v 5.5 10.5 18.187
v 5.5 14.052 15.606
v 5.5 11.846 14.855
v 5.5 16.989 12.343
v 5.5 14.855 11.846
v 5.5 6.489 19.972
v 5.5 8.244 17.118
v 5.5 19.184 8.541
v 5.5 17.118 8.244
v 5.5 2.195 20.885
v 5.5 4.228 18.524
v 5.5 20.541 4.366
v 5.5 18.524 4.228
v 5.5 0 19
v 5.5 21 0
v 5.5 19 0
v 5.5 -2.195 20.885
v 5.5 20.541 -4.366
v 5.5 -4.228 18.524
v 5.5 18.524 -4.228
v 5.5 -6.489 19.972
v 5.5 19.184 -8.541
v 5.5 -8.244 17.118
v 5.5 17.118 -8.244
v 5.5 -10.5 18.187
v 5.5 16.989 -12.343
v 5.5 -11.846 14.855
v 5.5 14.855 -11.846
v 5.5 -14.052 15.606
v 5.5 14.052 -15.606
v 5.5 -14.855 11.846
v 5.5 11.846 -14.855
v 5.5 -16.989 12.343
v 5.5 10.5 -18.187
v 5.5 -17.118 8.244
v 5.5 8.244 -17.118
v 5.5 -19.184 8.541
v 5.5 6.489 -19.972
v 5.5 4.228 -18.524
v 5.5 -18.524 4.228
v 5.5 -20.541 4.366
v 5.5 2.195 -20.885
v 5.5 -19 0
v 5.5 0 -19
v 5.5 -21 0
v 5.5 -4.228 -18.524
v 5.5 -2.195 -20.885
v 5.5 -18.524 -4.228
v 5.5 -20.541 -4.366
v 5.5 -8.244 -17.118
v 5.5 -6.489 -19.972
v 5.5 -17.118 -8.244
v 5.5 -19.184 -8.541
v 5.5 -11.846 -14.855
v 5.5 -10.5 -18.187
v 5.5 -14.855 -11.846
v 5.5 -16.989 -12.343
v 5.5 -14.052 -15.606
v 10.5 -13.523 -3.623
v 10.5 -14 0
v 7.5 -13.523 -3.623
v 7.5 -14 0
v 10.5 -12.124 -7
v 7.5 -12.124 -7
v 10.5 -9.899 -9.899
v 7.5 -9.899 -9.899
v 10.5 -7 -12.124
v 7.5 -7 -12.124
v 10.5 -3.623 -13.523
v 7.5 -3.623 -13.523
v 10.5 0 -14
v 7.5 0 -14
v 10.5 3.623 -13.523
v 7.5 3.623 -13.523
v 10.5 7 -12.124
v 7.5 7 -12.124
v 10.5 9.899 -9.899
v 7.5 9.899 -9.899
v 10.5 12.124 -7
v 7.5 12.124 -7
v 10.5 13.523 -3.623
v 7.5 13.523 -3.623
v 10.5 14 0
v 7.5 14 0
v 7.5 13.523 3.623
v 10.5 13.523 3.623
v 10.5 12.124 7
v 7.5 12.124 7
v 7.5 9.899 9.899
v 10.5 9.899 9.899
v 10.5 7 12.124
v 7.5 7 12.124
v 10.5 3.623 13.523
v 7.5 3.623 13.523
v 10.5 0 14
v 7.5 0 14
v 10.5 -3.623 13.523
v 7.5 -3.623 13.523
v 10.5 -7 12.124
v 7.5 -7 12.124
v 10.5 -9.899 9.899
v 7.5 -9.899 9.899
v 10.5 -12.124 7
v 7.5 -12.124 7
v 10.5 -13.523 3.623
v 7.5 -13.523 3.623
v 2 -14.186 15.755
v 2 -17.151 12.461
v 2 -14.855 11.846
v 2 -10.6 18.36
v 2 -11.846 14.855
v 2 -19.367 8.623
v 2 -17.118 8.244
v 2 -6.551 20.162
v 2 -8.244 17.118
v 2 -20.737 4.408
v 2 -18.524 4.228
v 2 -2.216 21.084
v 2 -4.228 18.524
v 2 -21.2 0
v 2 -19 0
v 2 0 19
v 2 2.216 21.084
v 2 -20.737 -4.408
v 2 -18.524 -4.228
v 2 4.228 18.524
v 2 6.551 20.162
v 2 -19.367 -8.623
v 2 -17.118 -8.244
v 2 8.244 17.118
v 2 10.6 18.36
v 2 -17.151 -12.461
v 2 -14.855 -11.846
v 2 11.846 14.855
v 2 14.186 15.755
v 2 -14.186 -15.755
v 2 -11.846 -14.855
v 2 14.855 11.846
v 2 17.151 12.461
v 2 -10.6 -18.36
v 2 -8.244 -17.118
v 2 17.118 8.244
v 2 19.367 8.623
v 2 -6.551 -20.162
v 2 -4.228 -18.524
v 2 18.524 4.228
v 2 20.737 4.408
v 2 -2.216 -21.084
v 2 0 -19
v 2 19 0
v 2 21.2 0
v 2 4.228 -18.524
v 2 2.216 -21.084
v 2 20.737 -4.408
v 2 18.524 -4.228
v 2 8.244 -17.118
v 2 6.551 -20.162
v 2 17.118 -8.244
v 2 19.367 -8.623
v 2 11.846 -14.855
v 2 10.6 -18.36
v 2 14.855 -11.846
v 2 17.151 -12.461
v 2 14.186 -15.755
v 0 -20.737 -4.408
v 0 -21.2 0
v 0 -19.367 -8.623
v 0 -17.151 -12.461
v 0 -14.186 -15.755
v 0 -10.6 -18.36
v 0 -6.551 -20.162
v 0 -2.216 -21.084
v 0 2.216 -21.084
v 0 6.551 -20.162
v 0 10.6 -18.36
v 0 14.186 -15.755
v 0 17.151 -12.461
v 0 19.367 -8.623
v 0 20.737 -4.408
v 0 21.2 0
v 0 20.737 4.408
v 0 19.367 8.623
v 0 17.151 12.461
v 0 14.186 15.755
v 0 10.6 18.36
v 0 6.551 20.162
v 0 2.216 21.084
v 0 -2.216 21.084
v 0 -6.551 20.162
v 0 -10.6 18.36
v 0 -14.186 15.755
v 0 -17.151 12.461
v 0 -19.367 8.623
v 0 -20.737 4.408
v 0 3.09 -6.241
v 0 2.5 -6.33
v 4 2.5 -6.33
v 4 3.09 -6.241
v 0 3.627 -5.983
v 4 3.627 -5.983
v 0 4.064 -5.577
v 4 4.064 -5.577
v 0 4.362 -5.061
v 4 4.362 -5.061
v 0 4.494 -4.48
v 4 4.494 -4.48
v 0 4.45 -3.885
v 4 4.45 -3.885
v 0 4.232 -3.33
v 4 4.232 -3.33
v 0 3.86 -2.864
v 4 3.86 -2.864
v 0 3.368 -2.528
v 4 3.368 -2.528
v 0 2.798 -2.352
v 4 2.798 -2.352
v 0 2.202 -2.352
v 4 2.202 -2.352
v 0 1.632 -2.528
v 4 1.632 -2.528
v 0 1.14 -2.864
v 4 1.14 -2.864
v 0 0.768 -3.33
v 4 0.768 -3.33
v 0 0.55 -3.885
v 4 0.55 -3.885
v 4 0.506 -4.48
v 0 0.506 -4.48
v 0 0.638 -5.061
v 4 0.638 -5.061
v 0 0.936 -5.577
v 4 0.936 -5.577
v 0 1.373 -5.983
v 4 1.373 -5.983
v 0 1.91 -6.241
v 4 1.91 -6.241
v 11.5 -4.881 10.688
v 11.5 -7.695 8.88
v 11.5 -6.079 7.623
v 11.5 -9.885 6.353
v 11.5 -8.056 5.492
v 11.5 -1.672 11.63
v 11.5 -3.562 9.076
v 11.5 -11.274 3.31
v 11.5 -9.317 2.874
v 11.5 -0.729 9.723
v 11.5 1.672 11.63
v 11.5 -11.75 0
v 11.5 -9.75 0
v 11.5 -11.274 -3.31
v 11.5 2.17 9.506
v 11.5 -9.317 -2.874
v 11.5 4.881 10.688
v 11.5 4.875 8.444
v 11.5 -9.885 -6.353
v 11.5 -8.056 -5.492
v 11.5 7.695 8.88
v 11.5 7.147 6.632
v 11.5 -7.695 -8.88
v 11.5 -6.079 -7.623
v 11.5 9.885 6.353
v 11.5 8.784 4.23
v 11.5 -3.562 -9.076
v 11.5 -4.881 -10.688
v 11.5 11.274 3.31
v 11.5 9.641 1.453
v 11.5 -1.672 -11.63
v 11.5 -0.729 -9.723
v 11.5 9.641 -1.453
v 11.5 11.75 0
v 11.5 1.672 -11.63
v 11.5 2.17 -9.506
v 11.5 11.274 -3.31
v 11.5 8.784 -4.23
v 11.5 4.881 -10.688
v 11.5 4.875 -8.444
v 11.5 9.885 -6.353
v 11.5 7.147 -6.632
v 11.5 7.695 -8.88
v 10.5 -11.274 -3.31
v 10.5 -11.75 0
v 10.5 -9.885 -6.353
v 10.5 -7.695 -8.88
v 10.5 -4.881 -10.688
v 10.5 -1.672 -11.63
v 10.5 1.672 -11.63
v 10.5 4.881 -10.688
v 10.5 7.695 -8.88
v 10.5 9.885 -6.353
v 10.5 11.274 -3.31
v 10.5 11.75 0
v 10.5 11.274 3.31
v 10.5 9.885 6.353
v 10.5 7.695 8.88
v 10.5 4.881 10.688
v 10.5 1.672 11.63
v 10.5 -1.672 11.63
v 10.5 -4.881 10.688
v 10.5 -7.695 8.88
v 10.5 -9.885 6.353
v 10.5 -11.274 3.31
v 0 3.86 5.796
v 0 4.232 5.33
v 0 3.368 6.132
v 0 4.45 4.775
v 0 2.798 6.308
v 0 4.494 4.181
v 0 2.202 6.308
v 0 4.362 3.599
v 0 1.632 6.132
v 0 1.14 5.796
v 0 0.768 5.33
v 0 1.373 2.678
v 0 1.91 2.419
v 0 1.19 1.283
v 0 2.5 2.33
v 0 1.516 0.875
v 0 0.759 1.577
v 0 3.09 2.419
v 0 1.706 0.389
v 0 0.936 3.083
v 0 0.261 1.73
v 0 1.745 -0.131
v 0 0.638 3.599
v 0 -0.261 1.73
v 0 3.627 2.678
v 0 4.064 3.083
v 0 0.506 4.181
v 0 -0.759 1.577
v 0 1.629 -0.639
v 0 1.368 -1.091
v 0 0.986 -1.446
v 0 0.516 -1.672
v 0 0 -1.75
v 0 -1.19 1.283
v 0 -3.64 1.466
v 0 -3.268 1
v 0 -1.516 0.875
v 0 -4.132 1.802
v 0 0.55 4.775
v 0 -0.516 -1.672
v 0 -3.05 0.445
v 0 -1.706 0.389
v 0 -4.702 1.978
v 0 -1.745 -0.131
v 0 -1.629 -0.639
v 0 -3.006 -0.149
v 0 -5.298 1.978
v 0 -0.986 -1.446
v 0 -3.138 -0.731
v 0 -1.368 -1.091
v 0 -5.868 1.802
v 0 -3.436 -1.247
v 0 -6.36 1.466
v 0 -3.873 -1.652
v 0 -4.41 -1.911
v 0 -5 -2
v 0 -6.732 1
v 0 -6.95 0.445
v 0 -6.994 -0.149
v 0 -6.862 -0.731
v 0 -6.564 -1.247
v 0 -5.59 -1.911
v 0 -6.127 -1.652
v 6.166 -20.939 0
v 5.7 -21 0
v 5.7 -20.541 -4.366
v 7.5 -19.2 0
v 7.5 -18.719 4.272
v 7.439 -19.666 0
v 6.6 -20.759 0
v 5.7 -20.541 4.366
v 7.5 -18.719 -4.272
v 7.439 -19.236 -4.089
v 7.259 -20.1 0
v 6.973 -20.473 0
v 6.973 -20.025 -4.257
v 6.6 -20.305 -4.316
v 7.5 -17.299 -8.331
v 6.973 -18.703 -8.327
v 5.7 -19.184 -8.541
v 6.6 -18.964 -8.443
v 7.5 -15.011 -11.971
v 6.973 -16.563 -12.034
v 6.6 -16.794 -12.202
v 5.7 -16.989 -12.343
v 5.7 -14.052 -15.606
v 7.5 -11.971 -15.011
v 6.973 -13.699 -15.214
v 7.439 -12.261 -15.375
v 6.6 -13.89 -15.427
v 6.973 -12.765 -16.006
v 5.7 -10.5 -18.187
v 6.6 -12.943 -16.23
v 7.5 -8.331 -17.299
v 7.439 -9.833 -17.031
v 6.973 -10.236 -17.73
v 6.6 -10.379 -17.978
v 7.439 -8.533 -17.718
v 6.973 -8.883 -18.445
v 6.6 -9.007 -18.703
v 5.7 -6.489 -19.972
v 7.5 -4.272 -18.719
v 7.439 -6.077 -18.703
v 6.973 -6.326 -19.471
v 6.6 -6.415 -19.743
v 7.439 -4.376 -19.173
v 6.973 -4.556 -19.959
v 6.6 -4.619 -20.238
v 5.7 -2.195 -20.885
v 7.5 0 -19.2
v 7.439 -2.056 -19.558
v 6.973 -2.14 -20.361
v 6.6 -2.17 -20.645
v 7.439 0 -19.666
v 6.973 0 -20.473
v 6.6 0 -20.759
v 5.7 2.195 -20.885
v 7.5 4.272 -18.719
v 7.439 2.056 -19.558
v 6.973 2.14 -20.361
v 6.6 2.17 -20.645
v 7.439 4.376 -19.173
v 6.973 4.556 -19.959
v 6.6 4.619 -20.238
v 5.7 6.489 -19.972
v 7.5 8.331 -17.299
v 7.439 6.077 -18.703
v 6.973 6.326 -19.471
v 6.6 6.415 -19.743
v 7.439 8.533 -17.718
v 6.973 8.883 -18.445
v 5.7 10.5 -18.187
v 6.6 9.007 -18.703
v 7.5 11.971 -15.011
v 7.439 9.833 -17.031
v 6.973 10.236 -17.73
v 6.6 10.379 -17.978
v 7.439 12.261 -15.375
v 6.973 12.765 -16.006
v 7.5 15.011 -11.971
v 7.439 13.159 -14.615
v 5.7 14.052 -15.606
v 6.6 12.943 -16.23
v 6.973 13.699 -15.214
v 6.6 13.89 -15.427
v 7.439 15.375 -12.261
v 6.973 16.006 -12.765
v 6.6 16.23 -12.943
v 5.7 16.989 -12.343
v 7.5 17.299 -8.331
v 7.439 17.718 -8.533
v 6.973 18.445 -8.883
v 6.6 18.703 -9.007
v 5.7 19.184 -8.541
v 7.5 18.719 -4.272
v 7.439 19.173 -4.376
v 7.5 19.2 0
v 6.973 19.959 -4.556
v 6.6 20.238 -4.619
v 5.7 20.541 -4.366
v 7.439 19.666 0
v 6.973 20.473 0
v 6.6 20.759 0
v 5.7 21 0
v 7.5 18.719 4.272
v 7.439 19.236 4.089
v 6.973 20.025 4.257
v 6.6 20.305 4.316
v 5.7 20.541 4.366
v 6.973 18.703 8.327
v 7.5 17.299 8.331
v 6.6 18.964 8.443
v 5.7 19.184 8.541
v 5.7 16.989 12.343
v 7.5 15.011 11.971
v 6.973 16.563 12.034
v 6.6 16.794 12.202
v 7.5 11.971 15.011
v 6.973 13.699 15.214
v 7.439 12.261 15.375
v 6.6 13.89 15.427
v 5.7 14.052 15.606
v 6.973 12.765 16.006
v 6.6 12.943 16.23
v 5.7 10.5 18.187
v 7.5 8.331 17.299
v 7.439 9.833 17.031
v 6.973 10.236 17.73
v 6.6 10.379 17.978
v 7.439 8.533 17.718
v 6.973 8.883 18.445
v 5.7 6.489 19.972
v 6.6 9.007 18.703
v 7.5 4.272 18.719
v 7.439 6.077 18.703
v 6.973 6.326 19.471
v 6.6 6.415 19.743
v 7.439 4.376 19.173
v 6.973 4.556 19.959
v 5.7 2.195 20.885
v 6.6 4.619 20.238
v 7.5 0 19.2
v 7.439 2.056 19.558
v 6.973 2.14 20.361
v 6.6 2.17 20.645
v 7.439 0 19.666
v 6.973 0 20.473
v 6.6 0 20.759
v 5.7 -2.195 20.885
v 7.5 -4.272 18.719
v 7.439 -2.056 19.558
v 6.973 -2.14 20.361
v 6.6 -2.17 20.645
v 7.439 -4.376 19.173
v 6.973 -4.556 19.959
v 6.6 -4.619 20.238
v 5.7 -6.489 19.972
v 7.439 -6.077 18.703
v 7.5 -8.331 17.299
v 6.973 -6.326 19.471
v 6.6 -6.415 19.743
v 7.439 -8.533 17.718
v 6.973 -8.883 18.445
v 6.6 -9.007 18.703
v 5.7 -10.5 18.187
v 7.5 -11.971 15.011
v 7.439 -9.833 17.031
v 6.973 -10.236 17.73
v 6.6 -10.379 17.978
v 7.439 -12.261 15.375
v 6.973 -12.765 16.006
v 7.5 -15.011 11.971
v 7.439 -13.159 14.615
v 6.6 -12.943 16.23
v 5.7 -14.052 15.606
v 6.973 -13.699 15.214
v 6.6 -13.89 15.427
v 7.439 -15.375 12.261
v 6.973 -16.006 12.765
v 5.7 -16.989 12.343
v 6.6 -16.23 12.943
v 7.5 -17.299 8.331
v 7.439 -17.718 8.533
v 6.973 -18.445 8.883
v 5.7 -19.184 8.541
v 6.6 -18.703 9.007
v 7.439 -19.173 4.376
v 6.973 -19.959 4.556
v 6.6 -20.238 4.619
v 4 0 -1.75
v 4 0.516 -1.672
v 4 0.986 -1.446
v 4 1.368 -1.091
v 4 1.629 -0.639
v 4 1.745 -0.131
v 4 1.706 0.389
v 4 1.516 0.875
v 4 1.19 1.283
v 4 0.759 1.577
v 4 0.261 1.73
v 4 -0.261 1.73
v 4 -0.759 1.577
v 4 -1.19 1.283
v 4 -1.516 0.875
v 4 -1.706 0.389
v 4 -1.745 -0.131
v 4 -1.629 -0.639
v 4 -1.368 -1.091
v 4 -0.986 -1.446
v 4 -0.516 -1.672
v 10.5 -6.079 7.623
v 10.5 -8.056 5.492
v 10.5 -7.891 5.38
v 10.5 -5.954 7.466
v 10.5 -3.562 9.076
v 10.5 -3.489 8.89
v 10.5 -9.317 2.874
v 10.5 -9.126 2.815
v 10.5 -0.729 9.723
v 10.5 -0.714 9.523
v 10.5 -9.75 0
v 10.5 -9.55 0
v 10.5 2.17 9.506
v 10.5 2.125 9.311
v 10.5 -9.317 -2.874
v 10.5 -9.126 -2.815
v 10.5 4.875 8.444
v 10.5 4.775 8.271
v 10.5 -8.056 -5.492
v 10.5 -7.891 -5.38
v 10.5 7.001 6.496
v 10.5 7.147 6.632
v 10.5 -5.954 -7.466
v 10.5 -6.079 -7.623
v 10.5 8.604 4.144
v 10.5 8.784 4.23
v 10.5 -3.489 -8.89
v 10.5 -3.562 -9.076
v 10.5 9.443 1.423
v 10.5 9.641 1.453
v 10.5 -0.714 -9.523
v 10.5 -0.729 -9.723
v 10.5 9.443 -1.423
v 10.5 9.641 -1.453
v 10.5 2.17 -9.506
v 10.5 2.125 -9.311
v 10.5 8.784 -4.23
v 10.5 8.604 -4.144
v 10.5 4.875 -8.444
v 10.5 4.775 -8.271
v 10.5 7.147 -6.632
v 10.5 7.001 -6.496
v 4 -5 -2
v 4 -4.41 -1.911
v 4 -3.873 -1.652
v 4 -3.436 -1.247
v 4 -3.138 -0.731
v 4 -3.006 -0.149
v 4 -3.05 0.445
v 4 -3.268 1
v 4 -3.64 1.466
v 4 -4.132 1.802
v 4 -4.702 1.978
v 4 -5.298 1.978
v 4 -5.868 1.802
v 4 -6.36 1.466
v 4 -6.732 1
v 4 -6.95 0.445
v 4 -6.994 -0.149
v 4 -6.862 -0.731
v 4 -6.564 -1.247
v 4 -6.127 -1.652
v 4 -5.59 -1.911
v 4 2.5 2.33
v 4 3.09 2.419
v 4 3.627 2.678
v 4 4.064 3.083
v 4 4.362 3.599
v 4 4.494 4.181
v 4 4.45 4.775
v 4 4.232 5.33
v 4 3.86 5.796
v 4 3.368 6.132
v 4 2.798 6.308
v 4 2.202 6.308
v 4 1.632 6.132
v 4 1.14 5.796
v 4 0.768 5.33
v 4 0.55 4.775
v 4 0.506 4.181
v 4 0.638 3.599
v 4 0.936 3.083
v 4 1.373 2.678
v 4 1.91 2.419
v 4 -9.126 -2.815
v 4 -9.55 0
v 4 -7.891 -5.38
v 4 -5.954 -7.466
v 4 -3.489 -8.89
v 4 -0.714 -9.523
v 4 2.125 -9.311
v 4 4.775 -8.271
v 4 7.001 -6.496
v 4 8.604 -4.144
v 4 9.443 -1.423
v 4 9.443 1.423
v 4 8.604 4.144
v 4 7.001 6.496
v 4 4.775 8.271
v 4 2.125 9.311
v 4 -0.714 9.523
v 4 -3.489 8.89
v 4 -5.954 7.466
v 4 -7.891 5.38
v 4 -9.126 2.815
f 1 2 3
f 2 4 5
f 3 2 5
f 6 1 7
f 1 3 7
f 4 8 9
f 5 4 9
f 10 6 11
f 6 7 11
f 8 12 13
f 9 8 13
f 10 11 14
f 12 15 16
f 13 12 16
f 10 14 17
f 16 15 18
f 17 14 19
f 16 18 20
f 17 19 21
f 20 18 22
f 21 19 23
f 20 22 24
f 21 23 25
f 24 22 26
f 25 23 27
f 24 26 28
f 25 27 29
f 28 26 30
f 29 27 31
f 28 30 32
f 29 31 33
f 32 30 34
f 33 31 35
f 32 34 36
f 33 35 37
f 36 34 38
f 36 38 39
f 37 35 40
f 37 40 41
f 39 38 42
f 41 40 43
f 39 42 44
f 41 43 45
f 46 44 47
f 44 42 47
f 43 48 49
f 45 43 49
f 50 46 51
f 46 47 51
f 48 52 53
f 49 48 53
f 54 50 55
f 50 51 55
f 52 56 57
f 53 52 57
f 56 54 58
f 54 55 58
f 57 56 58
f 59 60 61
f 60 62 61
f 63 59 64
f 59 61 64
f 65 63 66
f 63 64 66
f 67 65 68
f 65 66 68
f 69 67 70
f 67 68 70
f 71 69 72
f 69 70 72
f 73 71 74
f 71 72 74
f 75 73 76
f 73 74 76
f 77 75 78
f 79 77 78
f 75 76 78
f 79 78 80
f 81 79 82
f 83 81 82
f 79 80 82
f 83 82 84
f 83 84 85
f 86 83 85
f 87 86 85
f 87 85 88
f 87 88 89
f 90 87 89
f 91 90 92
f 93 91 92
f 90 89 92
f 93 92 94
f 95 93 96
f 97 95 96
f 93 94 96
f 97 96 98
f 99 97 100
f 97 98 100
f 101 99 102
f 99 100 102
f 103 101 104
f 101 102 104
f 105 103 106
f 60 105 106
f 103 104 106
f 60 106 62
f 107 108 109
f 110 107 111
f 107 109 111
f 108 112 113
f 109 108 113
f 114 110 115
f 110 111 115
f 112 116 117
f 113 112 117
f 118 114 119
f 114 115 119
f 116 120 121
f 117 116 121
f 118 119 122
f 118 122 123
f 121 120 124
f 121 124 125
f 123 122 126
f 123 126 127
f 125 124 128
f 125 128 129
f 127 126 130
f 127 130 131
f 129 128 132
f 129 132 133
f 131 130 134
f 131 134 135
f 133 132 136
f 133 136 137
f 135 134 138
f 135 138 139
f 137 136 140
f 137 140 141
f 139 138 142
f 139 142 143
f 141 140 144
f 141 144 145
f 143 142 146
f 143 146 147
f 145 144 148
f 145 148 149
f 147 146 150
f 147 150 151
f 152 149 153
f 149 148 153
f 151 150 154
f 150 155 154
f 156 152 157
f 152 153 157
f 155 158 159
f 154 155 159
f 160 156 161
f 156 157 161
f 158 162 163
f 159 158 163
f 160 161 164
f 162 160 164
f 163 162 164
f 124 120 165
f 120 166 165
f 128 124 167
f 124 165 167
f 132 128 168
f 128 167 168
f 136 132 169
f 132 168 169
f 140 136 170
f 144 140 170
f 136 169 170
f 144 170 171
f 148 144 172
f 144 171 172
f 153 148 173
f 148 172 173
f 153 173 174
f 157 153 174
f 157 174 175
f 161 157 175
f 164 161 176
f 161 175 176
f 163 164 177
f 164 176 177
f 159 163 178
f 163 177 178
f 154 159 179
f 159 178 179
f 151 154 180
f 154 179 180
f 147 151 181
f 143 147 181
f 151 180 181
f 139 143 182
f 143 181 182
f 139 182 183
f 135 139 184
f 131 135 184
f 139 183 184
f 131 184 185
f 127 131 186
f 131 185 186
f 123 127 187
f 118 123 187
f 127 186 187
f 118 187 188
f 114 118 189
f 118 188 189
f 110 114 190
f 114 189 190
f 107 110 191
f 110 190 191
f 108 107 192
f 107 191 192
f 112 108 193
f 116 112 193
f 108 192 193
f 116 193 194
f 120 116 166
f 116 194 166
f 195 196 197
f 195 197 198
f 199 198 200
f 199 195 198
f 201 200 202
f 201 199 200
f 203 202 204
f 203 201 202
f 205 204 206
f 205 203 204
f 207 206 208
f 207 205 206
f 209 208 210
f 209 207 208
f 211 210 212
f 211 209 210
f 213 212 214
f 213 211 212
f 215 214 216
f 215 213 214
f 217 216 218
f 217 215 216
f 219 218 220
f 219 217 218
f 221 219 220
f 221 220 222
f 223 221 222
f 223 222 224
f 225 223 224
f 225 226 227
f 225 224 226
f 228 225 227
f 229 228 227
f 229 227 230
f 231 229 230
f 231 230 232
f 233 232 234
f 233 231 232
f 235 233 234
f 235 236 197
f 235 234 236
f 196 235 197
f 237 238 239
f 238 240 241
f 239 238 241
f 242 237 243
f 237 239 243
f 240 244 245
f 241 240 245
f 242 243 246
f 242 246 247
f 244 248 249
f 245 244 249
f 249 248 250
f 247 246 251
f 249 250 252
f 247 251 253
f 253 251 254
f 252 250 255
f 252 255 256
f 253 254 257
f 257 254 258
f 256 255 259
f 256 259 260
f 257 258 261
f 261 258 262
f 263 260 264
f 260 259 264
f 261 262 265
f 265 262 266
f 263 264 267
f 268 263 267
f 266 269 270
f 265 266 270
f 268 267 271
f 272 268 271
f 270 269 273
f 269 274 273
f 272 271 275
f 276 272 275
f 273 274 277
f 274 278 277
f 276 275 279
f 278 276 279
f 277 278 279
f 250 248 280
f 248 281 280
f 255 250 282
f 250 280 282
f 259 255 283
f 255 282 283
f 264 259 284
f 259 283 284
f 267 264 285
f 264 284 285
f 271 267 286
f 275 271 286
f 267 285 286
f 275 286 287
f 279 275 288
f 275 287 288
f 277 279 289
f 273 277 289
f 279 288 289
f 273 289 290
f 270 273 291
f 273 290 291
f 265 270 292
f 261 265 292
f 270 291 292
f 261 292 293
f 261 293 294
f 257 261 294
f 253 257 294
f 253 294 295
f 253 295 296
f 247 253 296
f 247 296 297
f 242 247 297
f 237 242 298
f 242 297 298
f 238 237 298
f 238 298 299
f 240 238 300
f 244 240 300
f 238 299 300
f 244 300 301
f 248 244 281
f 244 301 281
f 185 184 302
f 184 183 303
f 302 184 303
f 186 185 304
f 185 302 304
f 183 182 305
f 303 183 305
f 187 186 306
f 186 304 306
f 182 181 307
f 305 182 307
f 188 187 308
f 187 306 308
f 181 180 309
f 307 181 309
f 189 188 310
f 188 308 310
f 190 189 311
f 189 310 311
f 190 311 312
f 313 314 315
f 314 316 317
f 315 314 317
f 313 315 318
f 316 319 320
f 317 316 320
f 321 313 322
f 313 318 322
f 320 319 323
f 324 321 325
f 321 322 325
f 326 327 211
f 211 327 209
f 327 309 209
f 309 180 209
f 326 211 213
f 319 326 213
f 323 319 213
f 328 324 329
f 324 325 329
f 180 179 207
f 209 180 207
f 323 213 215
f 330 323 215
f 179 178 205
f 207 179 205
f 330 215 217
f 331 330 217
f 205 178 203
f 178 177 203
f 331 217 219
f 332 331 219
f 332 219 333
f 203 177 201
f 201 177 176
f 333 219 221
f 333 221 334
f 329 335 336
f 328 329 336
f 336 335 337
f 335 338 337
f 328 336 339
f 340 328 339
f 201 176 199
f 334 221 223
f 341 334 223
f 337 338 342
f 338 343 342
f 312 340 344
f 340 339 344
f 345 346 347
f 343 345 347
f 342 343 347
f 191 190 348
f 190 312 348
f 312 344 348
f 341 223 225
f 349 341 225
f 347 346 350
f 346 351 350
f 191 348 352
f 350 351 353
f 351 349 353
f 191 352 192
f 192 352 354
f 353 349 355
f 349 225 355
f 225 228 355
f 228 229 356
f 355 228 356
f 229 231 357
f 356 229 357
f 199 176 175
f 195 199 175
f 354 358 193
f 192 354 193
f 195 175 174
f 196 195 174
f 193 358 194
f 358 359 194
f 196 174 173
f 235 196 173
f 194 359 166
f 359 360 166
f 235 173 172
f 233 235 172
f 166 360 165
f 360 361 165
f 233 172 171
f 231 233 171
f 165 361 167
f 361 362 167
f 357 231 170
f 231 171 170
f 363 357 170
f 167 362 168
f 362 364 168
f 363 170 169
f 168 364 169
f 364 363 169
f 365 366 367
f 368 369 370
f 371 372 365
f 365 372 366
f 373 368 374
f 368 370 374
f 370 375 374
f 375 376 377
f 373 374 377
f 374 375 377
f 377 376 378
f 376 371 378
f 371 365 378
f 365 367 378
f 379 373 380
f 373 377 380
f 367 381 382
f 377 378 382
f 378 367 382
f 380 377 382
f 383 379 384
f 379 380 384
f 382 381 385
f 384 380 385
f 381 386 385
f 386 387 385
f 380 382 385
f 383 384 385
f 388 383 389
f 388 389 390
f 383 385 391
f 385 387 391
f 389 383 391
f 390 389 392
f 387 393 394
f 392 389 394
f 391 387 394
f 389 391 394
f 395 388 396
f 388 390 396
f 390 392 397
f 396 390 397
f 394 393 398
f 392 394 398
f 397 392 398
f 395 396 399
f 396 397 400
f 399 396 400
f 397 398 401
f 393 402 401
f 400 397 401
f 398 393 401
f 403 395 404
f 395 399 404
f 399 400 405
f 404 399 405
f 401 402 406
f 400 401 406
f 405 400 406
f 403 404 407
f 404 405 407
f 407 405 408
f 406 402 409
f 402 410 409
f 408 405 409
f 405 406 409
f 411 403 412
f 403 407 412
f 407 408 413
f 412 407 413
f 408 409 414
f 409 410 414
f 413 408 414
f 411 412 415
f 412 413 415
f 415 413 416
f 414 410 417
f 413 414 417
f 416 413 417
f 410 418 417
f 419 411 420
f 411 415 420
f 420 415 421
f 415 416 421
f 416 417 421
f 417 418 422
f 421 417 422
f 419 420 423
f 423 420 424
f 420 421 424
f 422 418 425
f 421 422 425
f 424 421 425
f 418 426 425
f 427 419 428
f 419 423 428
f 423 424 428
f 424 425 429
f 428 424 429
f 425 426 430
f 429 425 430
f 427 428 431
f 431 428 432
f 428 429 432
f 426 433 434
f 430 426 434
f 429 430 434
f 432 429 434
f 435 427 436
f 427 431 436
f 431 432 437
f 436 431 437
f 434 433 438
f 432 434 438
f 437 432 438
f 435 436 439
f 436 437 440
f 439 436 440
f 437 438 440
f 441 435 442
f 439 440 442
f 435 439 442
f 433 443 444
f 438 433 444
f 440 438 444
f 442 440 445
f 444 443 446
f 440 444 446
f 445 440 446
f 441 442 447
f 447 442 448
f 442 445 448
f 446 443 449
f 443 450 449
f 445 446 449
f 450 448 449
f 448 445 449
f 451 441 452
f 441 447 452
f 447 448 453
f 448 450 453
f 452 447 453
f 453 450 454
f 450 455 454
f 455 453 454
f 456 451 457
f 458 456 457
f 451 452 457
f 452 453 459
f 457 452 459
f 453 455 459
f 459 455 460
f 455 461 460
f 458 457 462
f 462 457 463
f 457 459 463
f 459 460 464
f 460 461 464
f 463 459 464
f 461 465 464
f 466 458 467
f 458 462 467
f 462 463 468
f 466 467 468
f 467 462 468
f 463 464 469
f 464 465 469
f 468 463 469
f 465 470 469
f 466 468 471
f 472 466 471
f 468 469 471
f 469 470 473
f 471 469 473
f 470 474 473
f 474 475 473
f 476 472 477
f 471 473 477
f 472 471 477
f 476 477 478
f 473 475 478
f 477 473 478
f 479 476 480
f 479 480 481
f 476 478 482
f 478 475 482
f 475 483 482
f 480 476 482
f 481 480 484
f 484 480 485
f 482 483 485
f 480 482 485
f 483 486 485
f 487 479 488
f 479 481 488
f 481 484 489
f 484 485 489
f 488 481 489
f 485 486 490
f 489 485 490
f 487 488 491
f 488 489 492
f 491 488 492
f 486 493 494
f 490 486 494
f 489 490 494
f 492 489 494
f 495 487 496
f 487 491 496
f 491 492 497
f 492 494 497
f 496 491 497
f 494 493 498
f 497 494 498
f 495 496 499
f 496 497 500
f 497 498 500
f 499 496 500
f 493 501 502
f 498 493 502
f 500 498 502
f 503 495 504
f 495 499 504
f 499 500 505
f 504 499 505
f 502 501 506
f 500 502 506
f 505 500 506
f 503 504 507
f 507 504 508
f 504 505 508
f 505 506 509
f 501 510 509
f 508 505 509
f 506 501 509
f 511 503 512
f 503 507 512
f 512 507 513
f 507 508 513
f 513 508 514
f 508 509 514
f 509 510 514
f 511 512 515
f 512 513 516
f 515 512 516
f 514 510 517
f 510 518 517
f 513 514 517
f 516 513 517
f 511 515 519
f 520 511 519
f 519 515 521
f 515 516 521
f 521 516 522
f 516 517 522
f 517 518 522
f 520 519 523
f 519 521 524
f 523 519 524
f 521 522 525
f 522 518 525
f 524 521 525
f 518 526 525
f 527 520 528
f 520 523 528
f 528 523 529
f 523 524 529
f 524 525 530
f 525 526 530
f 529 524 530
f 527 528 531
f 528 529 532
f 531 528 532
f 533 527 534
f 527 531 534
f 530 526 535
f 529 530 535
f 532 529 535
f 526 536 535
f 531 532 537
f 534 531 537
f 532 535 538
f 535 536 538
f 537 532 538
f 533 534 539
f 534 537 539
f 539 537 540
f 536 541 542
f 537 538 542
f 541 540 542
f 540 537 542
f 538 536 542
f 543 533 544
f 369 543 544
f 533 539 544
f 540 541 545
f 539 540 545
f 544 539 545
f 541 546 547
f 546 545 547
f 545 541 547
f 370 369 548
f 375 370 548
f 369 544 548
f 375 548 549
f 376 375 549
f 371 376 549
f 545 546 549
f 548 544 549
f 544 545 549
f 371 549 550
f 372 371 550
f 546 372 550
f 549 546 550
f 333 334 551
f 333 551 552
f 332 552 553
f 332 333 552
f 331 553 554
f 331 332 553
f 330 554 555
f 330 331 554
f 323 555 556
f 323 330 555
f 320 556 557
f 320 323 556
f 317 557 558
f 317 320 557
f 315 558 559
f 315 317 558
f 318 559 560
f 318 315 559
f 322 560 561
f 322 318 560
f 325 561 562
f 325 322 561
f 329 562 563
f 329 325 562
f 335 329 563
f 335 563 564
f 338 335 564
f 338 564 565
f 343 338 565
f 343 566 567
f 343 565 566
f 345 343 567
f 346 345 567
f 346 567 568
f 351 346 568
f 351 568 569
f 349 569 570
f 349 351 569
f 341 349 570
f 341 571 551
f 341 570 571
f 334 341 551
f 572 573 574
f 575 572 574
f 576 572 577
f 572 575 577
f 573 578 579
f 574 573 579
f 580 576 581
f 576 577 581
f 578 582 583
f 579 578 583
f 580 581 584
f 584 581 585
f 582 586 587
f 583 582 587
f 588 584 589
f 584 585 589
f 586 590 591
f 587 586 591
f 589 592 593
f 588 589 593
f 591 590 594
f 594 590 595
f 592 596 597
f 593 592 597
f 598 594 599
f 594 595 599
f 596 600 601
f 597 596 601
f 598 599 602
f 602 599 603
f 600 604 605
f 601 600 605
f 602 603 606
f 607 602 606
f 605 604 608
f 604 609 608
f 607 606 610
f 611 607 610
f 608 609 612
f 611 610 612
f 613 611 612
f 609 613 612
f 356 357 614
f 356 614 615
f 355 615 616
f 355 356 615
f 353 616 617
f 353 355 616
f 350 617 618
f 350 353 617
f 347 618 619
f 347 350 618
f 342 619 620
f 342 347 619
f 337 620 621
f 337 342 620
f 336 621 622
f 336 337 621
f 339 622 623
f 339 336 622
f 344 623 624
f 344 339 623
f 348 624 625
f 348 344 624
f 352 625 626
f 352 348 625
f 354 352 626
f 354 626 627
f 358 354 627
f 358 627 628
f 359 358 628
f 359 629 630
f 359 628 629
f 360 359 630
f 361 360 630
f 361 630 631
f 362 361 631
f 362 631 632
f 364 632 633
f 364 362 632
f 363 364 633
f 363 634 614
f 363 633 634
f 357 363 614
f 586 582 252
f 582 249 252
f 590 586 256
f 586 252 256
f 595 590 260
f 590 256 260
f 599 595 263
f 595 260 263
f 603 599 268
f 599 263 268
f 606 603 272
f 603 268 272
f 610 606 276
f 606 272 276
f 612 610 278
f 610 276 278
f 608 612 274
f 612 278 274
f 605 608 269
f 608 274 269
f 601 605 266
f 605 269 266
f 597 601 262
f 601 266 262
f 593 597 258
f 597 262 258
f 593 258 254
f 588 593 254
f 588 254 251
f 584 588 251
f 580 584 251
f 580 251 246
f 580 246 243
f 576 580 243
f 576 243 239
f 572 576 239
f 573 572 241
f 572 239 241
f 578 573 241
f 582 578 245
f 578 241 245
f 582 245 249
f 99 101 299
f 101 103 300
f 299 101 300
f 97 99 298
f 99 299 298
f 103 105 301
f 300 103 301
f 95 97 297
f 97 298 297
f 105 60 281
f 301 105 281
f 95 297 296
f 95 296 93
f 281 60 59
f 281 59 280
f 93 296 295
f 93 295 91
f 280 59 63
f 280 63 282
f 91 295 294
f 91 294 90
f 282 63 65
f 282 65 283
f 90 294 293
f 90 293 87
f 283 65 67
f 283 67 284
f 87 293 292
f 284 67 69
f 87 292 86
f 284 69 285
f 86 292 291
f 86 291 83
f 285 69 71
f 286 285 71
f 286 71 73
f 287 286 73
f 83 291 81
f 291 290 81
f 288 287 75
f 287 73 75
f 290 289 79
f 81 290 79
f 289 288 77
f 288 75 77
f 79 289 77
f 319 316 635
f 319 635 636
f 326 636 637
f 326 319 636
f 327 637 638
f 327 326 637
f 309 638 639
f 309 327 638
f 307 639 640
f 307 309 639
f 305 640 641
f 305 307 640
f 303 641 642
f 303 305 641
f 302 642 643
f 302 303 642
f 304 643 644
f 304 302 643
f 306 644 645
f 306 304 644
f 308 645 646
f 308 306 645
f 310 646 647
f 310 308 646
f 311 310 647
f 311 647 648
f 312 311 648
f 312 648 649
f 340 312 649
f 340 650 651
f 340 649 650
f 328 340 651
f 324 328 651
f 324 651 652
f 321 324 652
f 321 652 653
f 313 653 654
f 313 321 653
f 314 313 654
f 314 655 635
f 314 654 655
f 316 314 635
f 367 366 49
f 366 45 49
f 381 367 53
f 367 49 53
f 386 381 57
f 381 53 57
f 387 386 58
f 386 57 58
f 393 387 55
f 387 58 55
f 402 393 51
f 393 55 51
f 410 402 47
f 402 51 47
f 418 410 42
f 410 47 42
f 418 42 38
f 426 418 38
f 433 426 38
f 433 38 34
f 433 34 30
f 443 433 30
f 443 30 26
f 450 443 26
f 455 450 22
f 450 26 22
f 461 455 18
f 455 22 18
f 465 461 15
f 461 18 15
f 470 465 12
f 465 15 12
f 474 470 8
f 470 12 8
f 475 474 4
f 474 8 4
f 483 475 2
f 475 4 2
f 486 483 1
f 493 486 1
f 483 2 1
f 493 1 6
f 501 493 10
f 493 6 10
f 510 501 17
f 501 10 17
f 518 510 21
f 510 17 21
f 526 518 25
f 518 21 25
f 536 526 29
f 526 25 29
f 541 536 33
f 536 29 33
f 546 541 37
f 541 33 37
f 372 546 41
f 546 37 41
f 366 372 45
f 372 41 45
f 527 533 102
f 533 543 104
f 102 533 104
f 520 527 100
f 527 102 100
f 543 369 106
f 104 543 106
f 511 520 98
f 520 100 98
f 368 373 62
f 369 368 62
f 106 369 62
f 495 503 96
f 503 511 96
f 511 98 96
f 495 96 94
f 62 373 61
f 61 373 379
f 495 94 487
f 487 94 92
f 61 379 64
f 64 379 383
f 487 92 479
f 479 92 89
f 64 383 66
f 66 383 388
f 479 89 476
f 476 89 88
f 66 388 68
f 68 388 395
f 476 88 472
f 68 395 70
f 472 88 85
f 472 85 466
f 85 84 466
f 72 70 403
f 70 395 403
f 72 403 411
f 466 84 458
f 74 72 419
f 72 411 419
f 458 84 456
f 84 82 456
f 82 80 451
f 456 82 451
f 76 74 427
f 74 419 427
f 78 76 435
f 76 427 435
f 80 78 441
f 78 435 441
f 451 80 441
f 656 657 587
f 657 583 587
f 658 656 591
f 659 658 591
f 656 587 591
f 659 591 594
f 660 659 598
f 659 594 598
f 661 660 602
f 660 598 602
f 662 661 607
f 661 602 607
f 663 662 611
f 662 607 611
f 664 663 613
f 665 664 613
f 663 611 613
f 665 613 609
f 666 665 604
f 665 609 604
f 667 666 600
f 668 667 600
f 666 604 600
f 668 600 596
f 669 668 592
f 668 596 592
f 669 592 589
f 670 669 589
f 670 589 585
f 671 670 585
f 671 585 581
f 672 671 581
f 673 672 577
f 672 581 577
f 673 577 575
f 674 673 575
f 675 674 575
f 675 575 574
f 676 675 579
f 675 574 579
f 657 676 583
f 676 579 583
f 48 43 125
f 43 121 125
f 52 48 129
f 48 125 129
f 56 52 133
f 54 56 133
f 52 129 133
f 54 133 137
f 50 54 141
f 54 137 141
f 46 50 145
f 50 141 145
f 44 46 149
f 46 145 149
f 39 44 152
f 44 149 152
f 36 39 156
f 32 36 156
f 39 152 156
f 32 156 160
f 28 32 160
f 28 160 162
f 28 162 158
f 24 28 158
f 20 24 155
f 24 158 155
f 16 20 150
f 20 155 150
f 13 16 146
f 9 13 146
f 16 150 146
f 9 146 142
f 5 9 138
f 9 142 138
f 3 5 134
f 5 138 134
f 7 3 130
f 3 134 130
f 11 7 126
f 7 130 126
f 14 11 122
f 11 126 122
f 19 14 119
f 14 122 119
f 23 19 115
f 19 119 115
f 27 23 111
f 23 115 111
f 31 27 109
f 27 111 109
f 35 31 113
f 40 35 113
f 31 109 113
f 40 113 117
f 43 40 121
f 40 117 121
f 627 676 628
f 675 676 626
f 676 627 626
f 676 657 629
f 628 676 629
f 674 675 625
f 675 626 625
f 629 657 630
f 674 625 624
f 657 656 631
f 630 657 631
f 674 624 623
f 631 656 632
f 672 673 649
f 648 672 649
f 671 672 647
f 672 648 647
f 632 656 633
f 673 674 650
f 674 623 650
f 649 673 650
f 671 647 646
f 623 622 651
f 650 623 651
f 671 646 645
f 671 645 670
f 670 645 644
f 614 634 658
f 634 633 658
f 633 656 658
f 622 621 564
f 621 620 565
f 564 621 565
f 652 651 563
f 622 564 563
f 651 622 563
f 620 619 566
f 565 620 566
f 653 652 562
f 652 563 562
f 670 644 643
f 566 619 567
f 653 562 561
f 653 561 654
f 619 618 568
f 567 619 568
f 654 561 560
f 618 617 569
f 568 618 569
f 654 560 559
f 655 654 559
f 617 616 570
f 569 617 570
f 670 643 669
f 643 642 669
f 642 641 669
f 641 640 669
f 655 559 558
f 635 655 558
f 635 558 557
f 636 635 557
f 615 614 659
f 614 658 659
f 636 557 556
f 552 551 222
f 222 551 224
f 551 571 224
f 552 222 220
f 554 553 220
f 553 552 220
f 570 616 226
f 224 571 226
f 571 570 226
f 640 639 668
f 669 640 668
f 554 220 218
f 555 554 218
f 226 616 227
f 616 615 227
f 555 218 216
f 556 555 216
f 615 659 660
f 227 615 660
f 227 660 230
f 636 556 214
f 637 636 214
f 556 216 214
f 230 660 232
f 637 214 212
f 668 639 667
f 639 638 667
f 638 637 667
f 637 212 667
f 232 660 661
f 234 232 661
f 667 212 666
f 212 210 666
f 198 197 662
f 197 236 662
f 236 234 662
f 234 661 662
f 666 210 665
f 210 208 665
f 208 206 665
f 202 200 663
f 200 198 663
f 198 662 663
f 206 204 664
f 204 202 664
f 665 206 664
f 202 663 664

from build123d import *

# Parameters (mm, degrees)
CUT_EXTRUDE2_DEPTH      = 33.111212995
CUT_EXTRUDE2_DEPTH_BACK = 33.111212995
SKETCH2_R               = 1.75
SKETCH2_R_2             = 2


with BuildPart() as part:
    # Sketch1 → Revolve1 (revolve)
    with BuildSketch(Plane.XY, mode=Mode.PRIVATE) as revolve1_sk:
        with BuildLine():
            Line((10.5, 14), (7.5, 14))
            Line((7.5, 14), (7.5, 19.2))
            ThreePointArc((7.5, 19.2), (6.972792206, 20.472792206), (5.7, 21))
            Line((5.7, 21), (5.5, 21))
            Line((5.5, 21), (5.5, 19))
            Line((5.5, 19), (2, 19))
            Line((2, 19), (2, 21.2))
            Line((2, 21.2), (0, 21.2))
            Line((0, 21.2), (0, 0))
            Line((0, 0), (4, 0))
            Line((4, 0), (4, 9.55))
            Line((4, 9.55), (10.5, 9.55))
            Line((10.5, 9.55), (10.5, 9.75))
            Line((10.5, 9.75), (11.5, 9.75))
            Line((11.5, 9.75), (11.5, 11.75))
            Line((11.5, 11.75), (10.5, 11.75))
            Line((10.5, 11.75), (10.5, 14))
        make_face()
    revolve(revolve1_sk.sketch.rotate(Axis((0, 0, 0), (1, 0, 0)), 180), axis=Axis((0, 0, 0), (1, 0, 0)))

    # Sketch2 → Cut-Extrude2 (cut, two sides: drawn at the far end of the back side and taken through both)
    with BuildSketch(Plane(origin=(0, 0, 0), x_dir=(0, 0, -1), z_dir=(1, 0, 0)).offset(-CUT_EXTRUDE2_DEPTH_BACK)):
        Circle(SKETCH2_R)
        with Locations((0, -5)):
            Circle(SKETCH2_R_2)
        with Locations((-4.330127019, 2.5)):
            Circle(SKETCH2_R_2)
        with Locations((4.330127019, 2.5)):
            Circle(SKETCH2_R_2)
    extrude(amount=CUT_EXTRUDE2_DEPTH + CUT_EXTRUDE2_DEPTH_BACK, mode=Mode.SUBTRACT)


solid = part.part
